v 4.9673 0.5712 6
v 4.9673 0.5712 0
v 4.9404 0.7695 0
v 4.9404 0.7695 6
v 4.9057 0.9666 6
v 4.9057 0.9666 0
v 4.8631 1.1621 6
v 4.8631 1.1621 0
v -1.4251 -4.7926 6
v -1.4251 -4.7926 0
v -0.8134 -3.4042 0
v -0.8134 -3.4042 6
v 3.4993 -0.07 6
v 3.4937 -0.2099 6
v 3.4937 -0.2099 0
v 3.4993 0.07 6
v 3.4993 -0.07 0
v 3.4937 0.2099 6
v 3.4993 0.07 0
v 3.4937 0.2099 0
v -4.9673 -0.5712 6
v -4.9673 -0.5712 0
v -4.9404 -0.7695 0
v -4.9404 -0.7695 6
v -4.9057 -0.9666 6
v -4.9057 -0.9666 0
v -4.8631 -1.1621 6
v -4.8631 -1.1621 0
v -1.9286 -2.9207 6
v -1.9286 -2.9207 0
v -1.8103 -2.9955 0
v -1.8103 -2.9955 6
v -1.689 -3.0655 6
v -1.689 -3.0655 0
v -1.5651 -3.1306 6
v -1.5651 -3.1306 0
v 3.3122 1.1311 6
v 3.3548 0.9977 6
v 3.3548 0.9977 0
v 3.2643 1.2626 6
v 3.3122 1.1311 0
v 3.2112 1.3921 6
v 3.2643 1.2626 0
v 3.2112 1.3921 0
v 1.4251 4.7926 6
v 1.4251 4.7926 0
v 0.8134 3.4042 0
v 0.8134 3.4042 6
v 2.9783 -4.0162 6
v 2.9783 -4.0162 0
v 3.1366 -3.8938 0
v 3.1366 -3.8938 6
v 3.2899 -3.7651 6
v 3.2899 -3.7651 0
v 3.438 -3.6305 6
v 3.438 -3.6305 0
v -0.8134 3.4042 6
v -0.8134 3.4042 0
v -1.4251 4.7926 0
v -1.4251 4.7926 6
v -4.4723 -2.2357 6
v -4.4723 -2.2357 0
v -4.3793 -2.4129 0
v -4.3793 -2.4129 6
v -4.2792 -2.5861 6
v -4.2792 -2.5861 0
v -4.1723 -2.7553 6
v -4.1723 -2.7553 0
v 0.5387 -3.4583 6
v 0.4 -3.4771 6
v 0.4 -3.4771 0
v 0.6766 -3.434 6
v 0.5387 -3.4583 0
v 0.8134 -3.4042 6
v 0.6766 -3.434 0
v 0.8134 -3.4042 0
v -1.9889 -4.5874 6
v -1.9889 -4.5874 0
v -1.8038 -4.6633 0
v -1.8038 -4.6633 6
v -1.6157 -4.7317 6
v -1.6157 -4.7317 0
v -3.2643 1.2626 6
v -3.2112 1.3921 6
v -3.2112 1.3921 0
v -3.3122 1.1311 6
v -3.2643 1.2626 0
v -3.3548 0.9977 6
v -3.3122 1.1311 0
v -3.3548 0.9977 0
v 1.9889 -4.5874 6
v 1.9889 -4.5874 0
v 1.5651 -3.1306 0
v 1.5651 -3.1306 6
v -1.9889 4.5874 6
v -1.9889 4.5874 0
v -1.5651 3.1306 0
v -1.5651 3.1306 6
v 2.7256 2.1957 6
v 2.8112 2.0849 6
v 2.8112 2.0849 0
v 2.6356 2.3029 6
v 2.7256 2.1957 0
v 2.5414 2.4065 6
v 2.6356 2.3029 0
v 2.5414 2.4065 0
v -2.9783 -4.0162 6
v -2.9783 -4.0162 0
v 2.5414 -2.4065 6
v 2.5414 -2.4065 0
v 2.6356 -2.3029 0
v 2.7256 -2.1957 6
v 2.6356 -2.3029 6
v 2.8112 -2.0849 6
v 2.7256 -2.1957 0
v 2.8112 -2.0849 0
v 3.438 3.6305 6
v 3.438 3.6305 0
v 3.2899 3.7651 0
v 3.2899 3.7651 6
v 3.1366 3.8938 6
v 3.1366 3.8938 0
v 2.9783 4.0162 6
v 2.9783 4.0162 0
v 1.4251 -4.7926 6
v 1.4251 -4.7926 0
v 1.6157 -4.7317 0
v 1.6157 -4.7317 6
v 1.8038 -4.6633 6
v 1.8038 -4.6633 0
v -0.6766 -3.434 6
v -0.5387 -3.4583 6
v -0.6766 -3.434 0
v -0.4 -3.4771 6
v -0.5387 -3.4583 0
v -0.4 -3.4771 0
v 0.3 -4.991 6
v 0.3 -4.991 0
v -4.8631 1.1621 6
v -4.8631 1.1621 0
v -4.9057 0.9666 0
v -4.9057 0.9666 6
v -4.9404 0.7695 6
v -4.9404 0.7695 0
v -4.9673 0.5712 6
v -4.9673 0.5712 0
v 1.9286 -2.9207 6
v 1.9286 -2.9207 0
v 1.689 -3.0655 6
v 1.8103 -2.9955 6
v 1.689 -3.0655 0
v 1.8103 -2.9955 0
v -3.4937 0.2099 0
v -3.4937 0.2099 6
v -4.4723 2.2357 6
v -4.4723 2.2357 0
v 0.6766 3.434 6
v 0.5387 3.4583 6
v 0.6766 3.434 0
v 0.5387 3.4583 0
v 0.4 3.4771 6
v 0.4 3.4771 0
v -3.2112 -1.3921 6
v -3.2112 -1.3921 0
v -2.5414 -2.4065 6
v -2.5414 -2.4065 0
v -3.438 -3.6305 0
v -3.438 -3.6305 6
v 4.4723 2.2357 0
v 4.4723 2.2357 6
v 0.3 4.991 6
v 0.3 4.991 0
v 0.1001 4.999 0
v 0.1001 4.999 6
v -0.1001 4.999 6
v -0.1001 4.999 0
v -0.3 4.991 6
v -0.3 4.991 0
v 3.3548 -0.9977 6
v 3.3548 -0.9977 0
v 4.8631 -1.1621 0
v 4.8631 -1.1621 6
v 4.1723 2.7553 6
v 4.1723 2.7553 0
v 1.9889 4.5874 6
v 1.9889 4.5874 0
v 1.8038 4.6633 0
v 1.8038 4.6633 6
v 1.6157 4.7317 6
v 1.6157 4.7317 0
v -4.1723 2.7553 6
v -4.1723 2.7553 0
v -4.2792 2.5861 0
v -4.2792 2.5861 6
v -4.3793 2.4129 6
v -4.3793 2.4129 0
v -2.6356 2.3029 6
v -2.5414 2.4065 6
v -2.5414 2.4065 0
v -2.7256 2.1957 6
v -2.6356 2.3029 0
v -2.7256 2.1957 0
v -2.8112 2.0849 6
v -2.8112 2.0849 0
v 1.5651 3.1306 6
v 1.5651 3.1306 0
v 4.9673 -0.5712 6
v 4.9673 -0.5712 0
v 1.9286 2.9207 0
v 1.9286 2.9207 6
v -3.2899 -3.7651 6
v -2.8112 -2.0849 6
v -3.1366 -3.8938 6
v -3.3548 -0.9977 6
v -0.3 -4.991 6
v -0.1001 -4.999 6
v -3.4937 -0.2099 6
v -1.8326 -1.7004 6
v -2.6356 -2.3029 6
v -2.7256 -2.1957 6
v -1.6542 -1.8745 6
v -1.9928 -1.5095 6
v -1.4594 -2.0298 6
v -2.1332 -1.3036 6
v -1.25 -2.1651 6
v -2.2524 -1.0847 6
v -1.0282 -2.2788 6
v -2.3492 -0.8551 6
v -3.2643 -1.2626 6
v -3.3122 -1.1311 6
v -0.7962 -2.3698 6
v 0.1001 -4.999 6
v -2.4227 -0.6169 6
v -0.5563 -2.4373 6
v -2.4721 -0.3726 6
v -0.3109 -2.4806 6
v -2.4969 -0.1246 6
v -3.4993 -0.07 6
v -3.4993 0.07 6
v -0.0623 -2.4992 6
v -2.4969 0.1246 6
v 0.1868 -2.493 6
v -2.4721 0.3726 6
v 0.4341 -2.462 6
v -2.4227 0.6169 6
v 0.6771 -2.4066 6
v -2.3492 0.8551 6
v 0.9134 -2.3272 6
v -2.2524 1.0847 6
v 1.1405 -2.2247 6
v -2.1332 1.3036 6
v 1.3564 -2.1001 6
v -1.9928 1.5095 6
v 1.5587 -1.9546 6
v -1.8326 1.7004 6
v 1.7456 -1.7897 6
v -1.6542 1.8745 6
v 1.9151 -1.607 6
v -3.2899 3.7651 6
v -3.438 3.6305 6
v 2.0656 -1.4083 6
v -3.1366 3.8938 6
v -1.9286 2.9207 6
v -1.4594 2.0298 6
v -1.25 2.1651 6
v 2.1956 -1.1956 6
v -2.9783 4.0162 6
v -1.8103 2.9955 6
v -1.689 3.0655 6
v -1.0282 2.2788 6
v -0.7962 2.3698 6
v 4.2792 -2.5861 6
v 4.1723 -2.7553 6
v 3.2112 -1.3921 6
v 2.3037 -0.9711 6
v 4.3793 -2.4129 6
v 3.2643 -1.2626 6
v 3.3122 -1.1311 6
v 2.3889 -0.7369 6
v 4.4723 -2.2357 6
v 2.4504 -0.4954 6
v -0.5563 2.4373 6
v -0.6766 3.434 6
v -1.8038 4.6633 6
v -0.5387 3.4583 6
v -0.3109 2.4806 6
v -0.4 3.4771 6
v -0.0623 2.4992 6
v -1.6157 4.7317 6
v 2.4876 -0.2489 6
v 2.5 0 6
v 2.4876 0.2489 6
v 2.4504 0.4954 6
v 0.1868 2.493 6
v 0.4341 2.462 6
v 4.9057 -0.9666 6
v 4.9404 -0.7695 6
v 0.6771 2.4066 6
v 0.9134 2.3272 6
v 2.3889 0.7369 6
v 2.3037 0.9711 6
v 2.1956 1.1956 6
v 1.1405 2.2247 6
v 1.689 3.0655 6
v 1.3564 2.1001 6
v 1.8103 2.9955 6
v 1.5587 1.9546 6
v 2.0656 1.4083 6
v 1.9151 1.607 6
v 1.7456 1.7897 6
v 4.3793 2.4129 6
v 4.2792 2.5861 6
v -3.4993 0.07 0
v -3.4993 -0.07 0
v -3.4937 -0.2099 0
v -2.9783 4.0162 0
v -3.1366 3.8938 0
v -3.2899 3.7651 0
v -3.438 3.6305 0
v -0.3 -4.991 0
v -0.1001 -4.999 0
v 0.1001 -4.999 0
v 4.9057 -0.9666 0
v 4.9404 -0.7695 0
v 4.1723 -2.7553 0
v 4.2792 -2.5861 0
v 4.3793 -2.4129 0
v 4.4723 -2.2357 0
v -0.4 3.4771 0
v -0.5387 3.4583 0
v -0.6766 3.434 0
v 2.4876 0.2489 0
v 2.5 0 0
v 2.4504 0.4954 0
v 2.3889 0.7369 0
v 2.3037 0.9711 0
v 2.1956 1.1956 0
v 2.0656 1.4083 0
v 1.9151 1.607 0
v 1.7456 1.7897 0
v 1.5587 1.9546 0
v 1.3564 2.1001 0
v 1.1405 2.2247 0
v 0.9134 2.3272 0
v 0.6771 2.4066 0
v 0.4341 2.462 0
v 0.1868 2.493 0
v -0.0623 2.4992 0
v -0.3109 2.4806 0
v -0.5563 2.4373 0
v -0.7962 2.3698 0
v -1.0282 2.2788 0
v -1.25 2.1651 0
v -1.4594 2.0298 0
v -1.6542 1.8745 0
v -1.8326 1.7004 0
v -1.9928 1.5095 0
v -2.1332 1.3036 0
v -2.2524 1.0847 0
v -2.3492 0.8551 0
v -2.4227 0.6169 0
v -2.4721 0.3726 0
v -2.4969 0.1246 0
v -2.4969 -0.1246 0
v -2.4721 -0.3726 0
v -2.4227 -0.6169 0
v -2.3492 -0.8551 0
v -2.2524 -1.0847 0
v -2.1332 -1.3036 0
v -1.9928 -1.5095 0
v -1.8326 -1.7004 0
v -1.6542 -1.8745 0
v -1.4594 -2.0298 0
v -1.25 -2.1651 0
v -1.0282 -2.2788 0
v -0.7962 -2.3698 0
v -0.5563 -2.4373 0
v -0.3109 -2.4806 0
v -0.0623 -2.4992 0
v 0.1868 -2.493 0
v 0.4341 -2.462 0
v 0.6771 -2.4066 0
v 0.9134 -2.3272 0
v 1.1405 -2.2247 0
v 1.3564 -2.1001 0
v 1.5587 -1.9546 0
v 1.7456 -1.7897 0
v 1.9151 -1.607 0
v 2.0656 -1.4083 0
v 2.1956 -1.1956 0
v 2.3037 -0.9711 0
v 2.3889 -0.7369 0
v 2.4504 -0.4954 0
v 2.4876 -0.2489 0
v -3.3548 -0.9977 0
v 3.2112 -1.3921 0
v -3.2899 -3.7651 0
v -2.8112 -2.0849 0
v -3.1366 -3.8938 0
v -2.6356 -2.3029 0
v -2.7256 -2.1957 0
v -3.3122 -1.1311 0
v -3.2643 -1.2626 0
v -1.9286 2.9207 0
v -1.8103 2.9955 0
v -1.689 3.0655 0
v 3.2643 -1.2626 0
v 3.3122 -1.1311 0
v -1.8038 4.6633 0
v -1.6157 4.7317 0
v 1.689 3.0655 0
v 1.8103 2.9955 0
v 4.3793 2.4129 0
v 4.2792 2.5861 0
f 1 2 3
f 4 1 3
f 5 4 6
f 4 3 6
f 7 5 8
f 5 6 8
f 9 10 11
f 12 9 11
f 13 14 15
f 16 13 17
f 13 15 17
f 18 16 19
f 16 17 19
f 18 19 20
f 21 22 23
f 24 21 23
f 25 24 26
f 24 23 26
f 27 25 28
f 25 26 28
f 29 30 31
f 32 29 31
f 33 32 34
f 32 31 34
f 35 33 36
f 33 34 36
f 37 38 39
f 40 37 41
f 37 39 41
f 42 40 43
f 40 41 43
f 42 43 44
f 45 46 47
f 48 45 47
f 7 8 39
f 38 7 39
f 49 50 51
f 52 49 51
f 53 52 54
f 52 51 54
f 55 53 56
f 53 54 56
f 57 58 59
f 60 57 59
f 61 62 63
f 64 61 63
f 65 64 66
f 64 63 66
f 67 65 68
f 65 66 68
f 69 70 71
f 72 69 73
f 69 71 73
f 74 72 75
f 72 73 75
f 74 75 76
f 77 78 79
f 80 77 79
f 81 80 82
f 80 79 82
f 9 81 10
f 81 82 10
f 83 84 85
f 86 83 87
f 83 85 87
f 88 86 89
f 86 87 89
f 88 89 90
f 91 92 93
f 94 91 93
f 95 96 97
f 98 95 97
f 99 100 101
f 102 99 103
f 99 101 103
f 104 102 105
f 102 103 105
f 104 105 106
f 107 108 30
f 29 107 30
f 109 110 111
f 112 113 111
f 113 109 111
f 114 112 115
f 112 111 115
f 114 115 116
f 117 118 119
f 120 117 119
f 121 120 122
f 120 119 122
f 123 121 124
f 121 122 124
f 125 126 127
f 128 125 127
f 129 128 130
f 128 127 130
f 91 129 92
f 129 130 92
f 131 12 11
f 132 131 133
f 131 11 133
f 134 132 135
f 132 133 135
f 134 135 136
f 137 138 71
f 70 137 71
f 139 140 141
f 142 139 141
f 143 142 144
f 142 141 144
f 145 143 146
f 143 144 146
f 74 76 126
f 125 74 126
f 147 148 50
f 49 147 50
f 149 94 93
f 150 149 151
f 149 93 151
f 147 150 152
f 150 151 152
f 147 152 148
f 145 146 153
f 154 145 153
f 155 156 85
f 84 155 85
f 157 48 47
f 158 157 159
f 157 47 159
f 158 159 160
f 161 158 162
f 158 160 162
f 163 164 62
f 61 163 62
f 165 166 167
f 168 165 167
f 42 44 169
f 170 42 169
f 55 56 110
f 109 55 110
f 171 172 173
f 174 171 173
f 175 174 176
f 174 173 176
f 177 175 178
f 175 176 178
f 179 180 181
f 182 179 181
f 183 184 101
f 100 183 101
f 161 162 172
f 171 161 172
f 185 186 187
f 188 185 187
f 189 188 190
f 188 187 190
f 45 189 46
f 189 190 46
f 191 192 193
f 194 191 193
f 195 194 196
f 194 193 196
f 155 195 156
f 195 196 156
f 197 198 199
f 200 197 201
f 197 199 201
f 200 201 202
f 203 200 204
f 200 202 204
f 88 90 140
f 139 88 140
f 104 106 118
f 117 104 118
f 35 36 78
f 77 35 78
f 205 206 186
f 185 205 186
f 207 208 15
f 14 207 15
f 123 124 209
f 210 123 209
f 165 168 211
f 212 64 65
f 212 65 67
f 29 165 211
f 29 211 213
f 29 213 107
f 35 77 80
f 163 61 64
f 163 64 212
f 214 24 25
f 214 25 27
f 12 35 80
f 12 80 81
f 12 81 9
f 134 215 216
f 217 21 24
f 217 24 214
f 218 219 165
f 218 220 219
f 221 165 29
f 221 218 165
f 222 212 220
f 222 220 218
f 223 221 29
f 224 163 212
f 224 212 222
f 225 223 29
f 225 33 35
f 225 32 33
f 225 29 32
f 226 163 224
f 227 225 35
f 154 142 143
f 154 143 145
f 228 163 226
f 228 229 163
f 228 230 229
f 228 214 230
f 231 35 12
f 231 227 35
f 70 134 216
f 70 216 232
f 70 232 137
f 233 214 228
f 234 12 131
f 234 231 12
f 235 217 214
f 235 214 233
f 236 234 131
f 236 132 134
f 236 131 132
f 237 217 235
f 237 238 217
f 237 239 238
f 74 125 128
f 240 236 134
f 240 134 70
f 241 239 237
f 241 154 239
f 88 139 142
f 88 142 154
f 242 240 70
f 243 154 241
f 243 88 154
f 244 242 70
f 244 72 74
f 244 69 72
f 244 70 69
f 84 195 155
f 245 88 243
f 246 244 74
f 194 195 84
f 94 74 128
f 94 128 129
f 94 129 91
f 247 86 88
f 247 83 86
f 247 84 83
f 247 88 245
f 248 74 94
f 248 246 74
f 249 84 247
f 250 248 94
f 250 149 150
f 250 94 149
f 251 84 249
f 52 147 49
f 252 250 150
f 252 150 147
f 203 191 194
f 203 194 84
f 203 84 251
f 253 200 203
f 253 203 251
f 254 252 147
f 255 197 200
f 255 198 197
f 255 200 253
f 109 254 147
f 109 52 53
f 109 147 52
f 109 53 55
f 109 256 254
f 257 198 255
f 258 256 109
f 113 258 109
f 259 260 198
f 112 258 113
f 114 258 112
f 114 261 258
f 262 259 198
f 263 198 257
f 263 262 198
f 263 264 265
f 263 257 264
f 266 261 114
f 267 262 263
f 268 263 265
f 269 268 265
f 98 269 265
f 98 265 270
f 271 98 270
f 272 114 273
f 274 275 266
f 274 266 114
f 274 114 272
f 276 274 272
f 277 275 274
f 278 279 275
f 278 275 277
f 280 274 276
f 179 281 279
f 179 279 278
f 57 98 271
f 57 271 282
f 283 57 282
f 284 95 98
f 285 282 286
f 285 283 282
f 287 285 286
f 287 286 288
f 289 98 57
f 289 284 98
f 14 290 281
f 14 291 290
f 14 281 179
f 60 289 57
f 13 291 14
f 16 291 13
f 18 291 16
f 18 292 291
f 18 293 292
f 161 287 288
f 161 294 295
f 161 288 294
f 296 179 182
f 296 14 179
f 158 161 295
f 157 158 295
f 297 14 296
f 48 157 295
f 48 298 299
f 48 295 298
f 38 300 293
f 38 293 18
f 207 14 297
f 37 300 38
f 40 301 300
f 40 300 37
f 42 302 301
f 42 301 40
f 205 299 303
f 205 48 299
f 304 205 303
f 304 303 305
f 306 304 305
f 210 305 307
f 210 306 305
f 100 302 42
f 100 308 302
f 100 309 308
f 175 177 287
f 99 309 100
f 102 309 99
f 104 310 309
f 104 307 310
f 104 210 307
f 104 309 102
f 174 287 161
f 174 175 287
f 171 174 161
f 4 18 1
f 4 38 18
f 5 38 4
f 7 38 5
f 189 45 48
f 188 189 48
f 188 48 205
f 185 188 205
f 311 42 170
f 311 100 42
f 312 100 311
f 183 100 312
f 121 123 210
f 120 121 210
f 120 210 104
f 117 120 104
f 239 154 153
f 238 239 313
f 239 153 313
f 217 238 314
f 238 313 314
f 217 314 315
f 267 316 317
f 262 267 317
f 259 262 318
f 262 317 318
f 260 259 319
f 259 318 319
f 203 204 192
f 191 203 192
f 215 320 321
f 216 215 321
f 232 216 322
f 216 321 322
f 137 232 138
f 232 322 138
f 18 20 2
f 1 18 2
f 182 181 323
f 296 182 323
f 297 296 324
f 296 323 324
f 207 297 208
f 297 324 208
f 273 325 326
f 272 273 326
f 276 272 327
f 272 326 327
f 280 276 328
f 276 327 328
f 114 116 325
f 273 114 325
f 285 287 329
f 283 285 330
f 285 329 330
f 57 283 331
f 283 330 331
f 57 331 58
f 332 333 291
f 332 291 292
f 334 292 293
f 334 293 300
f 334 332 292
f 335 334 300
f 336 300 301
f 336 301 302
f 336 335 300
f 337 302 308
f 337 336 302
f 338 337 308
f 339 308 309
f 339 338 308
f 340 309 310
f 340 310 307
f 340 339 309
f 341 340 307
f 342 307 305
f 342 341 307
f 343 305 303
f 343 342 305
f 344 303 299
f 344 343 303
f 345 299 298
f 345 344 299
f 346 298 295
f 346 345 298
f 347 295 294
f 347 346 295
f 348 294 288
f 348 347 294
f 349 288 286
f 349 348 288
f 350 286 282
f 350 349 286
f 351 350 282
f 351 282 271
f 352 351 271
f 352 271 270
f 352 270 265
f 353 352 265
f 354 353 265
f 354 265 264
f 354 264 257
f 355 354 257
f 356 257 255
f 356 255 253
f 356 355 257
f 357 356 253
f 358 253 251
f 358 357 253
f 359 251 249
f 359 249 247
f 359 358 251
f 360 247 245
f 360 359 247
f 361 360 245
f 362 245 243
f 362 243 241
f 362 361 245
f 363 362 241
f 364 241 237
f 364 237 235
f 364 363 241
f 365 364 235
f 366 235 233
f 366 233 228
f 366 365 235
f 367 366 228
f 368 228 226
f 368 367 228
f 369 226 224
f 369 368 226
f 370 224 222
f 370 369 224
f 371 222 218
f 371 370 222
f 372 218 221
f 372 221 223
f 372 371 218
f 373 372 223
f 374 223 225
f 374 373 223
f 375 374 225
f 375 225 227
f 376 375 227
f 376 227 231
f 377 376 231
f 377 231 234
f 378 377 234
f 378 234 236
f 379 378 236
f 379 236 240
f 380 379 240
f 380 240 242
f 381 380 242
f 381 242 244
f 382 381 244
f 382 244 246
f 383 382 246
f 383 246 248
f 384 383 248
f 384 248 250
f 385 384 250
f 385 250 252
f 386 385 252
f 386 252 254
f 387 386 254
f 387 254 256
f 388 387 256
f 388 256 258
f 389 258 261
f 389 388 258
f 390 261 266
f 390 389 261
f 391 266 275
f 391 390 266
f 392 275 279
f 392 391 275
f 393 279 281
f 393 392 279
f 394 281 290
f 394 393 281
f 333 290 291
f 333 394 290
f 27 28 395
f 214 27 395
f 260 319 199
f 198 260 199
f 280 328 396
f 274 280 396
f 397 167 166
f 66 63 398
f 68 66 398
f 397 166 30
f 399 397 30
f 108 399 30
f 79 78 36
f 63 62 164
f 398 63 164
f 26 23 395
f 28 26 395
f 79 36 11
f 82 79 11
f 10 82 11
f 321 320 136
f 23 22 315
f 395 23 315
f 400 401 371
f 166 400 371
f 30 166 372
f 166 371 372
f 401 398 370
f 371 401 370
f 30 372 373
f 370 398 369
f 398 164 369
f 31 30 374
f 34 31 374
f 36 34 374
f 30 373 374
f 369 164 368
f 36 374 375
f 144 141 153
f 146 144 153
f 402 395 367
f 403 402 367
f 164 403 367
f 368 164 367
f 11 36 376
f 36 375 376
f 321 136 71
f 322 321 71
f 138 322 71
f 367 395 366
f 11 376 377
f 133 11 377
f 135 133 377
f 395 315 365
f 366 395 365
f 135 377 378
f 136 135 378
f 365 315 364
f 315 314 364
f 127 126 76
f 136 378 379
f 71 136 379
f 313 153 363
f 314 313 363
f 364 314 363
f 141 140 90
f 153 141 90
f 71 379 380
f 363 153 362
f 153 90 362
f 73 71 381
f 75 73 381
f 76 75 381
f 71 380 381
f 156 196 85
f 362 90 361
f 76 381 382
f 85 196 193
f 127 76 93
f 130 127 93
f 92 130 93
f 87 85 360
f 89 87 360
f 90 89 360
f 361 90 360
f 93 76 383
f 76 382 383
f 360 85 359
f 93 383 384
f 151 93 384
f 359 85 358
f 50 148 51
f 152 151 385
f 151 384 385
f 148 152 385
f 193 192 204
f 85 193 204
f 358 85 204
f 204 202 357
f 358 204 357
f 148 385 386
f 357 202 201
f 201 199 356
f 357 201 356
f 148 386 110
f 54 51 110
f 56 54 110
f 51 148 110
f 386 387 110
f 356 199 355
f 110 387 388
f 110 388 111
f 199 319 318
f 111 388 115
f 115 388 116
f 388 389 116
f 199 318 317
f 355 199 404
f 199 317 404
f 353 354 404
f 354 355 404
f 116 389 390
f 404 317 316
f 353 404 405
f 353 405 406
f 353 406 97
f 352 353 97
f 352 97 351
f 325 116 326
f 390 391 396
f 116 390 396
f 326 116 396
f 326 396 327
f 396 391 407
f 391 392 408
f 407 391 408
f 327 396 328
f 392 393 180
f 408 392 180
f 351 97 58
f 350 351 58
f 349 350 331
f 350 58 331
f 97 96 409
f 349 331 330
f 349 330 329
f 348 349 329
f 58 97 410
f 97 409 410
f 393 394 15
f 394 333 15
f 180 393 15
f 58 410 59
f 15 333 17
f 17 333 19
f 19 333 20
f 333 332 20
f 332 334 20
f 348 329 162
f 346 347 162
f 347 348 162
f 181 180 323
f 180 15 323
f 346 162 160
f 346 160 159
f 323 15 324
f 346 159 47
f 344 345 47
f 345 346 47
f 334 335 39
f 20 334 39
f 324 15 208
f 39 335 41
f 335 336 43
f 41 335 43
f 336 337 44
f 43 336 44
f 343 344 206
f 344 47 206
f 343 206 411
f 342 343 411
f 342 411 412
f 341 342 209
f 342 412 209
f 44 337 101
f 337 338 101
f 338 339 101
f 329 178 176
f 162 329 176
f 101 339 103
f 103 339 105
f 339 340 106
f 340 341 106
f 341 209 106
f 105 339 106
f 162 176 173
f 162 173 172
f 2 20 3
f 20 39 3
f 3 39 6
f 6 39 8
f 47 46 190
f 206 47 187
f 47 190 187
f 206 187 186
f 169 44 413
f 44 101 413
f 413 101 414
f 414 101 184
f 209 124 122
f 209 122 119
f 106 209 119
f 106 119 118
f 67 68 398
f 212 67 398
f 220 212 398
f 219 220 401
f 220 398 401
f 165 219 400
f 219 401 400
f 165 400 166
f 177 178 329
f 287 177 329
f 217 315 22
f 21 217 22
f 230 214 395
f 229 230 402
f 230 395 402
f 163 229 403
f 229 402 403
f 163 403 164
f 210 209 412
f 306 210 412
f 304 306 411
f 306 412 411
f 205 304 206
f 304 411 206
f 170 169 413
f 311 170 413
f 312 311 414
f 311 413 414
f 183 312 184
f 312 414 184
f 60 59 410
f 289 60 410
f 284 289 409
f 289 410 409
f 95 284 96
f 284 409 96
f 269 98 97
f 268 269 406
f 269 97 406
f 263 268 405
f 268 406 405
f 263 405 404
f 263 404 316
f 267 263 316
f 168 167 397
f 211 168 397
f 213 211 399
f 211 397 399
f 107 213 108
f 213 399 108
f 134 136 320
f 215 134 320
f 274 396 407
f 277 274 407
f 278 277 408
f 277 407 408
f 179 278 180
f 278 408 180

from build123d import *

# Parameters (mm, degrees)
ESBO_O1_R                = 3.5
ESBO_O1_R_2              = 2.5
RESSALTO_EXTRUS_O1_DEPTH = 6
RESSALTO_EXTRUS_O2_DEPTH = 6
PADR_OCIRCULAR1_COUNT    = 18


with BuildPart() as part:
    # Esboço1 → Ressalto-extrusão1 (new body)
    with BuildSketch(Plane.XY):
        Circle(ESBO_O1_R)
        Circle(ESBO_O1_R_2, mode=Mode.SUBTRACT)
    extrude(amount=RESSALTO_EXTRUS_O1_DEPTH)

    # Esboço1<3> → Ressalto-extrusão2 (add)
    with BuildSketch(Plane.XY):
        with BuildLine():
            ThreePointArc((0.3, 4.990991885), (0, 5), (-0.3, 4.990991885))
            Line((-0.3, 4.990991885), (-0.4, 3.47706773))
            ThreePointArc((-0.4, 3.47706773), (0, 3.5), (0.4, 3.47706773))
            Line((0.4, 3.47706773), (0.3, 4.990991885))
        make_face()
    ressalto_extrus_o2 = extrude(amount=RESSALTO_EXTRUS_O2_DEPTH)

    # PadrãoCircular1: Ressalto-extrusão2 ×18 about axis
    padr_ocircular1_axis = Axis((0, 0, 0), (0, 0, 1))
    for i in range(1, PADR_OCIRCULAR1_COUNT):
        add(ressalto_extrus_o2.rotate(padr_ocircular1_axis, i * 360 / PADR_OCIRCULAR1_COUNT))


solid = part.part
